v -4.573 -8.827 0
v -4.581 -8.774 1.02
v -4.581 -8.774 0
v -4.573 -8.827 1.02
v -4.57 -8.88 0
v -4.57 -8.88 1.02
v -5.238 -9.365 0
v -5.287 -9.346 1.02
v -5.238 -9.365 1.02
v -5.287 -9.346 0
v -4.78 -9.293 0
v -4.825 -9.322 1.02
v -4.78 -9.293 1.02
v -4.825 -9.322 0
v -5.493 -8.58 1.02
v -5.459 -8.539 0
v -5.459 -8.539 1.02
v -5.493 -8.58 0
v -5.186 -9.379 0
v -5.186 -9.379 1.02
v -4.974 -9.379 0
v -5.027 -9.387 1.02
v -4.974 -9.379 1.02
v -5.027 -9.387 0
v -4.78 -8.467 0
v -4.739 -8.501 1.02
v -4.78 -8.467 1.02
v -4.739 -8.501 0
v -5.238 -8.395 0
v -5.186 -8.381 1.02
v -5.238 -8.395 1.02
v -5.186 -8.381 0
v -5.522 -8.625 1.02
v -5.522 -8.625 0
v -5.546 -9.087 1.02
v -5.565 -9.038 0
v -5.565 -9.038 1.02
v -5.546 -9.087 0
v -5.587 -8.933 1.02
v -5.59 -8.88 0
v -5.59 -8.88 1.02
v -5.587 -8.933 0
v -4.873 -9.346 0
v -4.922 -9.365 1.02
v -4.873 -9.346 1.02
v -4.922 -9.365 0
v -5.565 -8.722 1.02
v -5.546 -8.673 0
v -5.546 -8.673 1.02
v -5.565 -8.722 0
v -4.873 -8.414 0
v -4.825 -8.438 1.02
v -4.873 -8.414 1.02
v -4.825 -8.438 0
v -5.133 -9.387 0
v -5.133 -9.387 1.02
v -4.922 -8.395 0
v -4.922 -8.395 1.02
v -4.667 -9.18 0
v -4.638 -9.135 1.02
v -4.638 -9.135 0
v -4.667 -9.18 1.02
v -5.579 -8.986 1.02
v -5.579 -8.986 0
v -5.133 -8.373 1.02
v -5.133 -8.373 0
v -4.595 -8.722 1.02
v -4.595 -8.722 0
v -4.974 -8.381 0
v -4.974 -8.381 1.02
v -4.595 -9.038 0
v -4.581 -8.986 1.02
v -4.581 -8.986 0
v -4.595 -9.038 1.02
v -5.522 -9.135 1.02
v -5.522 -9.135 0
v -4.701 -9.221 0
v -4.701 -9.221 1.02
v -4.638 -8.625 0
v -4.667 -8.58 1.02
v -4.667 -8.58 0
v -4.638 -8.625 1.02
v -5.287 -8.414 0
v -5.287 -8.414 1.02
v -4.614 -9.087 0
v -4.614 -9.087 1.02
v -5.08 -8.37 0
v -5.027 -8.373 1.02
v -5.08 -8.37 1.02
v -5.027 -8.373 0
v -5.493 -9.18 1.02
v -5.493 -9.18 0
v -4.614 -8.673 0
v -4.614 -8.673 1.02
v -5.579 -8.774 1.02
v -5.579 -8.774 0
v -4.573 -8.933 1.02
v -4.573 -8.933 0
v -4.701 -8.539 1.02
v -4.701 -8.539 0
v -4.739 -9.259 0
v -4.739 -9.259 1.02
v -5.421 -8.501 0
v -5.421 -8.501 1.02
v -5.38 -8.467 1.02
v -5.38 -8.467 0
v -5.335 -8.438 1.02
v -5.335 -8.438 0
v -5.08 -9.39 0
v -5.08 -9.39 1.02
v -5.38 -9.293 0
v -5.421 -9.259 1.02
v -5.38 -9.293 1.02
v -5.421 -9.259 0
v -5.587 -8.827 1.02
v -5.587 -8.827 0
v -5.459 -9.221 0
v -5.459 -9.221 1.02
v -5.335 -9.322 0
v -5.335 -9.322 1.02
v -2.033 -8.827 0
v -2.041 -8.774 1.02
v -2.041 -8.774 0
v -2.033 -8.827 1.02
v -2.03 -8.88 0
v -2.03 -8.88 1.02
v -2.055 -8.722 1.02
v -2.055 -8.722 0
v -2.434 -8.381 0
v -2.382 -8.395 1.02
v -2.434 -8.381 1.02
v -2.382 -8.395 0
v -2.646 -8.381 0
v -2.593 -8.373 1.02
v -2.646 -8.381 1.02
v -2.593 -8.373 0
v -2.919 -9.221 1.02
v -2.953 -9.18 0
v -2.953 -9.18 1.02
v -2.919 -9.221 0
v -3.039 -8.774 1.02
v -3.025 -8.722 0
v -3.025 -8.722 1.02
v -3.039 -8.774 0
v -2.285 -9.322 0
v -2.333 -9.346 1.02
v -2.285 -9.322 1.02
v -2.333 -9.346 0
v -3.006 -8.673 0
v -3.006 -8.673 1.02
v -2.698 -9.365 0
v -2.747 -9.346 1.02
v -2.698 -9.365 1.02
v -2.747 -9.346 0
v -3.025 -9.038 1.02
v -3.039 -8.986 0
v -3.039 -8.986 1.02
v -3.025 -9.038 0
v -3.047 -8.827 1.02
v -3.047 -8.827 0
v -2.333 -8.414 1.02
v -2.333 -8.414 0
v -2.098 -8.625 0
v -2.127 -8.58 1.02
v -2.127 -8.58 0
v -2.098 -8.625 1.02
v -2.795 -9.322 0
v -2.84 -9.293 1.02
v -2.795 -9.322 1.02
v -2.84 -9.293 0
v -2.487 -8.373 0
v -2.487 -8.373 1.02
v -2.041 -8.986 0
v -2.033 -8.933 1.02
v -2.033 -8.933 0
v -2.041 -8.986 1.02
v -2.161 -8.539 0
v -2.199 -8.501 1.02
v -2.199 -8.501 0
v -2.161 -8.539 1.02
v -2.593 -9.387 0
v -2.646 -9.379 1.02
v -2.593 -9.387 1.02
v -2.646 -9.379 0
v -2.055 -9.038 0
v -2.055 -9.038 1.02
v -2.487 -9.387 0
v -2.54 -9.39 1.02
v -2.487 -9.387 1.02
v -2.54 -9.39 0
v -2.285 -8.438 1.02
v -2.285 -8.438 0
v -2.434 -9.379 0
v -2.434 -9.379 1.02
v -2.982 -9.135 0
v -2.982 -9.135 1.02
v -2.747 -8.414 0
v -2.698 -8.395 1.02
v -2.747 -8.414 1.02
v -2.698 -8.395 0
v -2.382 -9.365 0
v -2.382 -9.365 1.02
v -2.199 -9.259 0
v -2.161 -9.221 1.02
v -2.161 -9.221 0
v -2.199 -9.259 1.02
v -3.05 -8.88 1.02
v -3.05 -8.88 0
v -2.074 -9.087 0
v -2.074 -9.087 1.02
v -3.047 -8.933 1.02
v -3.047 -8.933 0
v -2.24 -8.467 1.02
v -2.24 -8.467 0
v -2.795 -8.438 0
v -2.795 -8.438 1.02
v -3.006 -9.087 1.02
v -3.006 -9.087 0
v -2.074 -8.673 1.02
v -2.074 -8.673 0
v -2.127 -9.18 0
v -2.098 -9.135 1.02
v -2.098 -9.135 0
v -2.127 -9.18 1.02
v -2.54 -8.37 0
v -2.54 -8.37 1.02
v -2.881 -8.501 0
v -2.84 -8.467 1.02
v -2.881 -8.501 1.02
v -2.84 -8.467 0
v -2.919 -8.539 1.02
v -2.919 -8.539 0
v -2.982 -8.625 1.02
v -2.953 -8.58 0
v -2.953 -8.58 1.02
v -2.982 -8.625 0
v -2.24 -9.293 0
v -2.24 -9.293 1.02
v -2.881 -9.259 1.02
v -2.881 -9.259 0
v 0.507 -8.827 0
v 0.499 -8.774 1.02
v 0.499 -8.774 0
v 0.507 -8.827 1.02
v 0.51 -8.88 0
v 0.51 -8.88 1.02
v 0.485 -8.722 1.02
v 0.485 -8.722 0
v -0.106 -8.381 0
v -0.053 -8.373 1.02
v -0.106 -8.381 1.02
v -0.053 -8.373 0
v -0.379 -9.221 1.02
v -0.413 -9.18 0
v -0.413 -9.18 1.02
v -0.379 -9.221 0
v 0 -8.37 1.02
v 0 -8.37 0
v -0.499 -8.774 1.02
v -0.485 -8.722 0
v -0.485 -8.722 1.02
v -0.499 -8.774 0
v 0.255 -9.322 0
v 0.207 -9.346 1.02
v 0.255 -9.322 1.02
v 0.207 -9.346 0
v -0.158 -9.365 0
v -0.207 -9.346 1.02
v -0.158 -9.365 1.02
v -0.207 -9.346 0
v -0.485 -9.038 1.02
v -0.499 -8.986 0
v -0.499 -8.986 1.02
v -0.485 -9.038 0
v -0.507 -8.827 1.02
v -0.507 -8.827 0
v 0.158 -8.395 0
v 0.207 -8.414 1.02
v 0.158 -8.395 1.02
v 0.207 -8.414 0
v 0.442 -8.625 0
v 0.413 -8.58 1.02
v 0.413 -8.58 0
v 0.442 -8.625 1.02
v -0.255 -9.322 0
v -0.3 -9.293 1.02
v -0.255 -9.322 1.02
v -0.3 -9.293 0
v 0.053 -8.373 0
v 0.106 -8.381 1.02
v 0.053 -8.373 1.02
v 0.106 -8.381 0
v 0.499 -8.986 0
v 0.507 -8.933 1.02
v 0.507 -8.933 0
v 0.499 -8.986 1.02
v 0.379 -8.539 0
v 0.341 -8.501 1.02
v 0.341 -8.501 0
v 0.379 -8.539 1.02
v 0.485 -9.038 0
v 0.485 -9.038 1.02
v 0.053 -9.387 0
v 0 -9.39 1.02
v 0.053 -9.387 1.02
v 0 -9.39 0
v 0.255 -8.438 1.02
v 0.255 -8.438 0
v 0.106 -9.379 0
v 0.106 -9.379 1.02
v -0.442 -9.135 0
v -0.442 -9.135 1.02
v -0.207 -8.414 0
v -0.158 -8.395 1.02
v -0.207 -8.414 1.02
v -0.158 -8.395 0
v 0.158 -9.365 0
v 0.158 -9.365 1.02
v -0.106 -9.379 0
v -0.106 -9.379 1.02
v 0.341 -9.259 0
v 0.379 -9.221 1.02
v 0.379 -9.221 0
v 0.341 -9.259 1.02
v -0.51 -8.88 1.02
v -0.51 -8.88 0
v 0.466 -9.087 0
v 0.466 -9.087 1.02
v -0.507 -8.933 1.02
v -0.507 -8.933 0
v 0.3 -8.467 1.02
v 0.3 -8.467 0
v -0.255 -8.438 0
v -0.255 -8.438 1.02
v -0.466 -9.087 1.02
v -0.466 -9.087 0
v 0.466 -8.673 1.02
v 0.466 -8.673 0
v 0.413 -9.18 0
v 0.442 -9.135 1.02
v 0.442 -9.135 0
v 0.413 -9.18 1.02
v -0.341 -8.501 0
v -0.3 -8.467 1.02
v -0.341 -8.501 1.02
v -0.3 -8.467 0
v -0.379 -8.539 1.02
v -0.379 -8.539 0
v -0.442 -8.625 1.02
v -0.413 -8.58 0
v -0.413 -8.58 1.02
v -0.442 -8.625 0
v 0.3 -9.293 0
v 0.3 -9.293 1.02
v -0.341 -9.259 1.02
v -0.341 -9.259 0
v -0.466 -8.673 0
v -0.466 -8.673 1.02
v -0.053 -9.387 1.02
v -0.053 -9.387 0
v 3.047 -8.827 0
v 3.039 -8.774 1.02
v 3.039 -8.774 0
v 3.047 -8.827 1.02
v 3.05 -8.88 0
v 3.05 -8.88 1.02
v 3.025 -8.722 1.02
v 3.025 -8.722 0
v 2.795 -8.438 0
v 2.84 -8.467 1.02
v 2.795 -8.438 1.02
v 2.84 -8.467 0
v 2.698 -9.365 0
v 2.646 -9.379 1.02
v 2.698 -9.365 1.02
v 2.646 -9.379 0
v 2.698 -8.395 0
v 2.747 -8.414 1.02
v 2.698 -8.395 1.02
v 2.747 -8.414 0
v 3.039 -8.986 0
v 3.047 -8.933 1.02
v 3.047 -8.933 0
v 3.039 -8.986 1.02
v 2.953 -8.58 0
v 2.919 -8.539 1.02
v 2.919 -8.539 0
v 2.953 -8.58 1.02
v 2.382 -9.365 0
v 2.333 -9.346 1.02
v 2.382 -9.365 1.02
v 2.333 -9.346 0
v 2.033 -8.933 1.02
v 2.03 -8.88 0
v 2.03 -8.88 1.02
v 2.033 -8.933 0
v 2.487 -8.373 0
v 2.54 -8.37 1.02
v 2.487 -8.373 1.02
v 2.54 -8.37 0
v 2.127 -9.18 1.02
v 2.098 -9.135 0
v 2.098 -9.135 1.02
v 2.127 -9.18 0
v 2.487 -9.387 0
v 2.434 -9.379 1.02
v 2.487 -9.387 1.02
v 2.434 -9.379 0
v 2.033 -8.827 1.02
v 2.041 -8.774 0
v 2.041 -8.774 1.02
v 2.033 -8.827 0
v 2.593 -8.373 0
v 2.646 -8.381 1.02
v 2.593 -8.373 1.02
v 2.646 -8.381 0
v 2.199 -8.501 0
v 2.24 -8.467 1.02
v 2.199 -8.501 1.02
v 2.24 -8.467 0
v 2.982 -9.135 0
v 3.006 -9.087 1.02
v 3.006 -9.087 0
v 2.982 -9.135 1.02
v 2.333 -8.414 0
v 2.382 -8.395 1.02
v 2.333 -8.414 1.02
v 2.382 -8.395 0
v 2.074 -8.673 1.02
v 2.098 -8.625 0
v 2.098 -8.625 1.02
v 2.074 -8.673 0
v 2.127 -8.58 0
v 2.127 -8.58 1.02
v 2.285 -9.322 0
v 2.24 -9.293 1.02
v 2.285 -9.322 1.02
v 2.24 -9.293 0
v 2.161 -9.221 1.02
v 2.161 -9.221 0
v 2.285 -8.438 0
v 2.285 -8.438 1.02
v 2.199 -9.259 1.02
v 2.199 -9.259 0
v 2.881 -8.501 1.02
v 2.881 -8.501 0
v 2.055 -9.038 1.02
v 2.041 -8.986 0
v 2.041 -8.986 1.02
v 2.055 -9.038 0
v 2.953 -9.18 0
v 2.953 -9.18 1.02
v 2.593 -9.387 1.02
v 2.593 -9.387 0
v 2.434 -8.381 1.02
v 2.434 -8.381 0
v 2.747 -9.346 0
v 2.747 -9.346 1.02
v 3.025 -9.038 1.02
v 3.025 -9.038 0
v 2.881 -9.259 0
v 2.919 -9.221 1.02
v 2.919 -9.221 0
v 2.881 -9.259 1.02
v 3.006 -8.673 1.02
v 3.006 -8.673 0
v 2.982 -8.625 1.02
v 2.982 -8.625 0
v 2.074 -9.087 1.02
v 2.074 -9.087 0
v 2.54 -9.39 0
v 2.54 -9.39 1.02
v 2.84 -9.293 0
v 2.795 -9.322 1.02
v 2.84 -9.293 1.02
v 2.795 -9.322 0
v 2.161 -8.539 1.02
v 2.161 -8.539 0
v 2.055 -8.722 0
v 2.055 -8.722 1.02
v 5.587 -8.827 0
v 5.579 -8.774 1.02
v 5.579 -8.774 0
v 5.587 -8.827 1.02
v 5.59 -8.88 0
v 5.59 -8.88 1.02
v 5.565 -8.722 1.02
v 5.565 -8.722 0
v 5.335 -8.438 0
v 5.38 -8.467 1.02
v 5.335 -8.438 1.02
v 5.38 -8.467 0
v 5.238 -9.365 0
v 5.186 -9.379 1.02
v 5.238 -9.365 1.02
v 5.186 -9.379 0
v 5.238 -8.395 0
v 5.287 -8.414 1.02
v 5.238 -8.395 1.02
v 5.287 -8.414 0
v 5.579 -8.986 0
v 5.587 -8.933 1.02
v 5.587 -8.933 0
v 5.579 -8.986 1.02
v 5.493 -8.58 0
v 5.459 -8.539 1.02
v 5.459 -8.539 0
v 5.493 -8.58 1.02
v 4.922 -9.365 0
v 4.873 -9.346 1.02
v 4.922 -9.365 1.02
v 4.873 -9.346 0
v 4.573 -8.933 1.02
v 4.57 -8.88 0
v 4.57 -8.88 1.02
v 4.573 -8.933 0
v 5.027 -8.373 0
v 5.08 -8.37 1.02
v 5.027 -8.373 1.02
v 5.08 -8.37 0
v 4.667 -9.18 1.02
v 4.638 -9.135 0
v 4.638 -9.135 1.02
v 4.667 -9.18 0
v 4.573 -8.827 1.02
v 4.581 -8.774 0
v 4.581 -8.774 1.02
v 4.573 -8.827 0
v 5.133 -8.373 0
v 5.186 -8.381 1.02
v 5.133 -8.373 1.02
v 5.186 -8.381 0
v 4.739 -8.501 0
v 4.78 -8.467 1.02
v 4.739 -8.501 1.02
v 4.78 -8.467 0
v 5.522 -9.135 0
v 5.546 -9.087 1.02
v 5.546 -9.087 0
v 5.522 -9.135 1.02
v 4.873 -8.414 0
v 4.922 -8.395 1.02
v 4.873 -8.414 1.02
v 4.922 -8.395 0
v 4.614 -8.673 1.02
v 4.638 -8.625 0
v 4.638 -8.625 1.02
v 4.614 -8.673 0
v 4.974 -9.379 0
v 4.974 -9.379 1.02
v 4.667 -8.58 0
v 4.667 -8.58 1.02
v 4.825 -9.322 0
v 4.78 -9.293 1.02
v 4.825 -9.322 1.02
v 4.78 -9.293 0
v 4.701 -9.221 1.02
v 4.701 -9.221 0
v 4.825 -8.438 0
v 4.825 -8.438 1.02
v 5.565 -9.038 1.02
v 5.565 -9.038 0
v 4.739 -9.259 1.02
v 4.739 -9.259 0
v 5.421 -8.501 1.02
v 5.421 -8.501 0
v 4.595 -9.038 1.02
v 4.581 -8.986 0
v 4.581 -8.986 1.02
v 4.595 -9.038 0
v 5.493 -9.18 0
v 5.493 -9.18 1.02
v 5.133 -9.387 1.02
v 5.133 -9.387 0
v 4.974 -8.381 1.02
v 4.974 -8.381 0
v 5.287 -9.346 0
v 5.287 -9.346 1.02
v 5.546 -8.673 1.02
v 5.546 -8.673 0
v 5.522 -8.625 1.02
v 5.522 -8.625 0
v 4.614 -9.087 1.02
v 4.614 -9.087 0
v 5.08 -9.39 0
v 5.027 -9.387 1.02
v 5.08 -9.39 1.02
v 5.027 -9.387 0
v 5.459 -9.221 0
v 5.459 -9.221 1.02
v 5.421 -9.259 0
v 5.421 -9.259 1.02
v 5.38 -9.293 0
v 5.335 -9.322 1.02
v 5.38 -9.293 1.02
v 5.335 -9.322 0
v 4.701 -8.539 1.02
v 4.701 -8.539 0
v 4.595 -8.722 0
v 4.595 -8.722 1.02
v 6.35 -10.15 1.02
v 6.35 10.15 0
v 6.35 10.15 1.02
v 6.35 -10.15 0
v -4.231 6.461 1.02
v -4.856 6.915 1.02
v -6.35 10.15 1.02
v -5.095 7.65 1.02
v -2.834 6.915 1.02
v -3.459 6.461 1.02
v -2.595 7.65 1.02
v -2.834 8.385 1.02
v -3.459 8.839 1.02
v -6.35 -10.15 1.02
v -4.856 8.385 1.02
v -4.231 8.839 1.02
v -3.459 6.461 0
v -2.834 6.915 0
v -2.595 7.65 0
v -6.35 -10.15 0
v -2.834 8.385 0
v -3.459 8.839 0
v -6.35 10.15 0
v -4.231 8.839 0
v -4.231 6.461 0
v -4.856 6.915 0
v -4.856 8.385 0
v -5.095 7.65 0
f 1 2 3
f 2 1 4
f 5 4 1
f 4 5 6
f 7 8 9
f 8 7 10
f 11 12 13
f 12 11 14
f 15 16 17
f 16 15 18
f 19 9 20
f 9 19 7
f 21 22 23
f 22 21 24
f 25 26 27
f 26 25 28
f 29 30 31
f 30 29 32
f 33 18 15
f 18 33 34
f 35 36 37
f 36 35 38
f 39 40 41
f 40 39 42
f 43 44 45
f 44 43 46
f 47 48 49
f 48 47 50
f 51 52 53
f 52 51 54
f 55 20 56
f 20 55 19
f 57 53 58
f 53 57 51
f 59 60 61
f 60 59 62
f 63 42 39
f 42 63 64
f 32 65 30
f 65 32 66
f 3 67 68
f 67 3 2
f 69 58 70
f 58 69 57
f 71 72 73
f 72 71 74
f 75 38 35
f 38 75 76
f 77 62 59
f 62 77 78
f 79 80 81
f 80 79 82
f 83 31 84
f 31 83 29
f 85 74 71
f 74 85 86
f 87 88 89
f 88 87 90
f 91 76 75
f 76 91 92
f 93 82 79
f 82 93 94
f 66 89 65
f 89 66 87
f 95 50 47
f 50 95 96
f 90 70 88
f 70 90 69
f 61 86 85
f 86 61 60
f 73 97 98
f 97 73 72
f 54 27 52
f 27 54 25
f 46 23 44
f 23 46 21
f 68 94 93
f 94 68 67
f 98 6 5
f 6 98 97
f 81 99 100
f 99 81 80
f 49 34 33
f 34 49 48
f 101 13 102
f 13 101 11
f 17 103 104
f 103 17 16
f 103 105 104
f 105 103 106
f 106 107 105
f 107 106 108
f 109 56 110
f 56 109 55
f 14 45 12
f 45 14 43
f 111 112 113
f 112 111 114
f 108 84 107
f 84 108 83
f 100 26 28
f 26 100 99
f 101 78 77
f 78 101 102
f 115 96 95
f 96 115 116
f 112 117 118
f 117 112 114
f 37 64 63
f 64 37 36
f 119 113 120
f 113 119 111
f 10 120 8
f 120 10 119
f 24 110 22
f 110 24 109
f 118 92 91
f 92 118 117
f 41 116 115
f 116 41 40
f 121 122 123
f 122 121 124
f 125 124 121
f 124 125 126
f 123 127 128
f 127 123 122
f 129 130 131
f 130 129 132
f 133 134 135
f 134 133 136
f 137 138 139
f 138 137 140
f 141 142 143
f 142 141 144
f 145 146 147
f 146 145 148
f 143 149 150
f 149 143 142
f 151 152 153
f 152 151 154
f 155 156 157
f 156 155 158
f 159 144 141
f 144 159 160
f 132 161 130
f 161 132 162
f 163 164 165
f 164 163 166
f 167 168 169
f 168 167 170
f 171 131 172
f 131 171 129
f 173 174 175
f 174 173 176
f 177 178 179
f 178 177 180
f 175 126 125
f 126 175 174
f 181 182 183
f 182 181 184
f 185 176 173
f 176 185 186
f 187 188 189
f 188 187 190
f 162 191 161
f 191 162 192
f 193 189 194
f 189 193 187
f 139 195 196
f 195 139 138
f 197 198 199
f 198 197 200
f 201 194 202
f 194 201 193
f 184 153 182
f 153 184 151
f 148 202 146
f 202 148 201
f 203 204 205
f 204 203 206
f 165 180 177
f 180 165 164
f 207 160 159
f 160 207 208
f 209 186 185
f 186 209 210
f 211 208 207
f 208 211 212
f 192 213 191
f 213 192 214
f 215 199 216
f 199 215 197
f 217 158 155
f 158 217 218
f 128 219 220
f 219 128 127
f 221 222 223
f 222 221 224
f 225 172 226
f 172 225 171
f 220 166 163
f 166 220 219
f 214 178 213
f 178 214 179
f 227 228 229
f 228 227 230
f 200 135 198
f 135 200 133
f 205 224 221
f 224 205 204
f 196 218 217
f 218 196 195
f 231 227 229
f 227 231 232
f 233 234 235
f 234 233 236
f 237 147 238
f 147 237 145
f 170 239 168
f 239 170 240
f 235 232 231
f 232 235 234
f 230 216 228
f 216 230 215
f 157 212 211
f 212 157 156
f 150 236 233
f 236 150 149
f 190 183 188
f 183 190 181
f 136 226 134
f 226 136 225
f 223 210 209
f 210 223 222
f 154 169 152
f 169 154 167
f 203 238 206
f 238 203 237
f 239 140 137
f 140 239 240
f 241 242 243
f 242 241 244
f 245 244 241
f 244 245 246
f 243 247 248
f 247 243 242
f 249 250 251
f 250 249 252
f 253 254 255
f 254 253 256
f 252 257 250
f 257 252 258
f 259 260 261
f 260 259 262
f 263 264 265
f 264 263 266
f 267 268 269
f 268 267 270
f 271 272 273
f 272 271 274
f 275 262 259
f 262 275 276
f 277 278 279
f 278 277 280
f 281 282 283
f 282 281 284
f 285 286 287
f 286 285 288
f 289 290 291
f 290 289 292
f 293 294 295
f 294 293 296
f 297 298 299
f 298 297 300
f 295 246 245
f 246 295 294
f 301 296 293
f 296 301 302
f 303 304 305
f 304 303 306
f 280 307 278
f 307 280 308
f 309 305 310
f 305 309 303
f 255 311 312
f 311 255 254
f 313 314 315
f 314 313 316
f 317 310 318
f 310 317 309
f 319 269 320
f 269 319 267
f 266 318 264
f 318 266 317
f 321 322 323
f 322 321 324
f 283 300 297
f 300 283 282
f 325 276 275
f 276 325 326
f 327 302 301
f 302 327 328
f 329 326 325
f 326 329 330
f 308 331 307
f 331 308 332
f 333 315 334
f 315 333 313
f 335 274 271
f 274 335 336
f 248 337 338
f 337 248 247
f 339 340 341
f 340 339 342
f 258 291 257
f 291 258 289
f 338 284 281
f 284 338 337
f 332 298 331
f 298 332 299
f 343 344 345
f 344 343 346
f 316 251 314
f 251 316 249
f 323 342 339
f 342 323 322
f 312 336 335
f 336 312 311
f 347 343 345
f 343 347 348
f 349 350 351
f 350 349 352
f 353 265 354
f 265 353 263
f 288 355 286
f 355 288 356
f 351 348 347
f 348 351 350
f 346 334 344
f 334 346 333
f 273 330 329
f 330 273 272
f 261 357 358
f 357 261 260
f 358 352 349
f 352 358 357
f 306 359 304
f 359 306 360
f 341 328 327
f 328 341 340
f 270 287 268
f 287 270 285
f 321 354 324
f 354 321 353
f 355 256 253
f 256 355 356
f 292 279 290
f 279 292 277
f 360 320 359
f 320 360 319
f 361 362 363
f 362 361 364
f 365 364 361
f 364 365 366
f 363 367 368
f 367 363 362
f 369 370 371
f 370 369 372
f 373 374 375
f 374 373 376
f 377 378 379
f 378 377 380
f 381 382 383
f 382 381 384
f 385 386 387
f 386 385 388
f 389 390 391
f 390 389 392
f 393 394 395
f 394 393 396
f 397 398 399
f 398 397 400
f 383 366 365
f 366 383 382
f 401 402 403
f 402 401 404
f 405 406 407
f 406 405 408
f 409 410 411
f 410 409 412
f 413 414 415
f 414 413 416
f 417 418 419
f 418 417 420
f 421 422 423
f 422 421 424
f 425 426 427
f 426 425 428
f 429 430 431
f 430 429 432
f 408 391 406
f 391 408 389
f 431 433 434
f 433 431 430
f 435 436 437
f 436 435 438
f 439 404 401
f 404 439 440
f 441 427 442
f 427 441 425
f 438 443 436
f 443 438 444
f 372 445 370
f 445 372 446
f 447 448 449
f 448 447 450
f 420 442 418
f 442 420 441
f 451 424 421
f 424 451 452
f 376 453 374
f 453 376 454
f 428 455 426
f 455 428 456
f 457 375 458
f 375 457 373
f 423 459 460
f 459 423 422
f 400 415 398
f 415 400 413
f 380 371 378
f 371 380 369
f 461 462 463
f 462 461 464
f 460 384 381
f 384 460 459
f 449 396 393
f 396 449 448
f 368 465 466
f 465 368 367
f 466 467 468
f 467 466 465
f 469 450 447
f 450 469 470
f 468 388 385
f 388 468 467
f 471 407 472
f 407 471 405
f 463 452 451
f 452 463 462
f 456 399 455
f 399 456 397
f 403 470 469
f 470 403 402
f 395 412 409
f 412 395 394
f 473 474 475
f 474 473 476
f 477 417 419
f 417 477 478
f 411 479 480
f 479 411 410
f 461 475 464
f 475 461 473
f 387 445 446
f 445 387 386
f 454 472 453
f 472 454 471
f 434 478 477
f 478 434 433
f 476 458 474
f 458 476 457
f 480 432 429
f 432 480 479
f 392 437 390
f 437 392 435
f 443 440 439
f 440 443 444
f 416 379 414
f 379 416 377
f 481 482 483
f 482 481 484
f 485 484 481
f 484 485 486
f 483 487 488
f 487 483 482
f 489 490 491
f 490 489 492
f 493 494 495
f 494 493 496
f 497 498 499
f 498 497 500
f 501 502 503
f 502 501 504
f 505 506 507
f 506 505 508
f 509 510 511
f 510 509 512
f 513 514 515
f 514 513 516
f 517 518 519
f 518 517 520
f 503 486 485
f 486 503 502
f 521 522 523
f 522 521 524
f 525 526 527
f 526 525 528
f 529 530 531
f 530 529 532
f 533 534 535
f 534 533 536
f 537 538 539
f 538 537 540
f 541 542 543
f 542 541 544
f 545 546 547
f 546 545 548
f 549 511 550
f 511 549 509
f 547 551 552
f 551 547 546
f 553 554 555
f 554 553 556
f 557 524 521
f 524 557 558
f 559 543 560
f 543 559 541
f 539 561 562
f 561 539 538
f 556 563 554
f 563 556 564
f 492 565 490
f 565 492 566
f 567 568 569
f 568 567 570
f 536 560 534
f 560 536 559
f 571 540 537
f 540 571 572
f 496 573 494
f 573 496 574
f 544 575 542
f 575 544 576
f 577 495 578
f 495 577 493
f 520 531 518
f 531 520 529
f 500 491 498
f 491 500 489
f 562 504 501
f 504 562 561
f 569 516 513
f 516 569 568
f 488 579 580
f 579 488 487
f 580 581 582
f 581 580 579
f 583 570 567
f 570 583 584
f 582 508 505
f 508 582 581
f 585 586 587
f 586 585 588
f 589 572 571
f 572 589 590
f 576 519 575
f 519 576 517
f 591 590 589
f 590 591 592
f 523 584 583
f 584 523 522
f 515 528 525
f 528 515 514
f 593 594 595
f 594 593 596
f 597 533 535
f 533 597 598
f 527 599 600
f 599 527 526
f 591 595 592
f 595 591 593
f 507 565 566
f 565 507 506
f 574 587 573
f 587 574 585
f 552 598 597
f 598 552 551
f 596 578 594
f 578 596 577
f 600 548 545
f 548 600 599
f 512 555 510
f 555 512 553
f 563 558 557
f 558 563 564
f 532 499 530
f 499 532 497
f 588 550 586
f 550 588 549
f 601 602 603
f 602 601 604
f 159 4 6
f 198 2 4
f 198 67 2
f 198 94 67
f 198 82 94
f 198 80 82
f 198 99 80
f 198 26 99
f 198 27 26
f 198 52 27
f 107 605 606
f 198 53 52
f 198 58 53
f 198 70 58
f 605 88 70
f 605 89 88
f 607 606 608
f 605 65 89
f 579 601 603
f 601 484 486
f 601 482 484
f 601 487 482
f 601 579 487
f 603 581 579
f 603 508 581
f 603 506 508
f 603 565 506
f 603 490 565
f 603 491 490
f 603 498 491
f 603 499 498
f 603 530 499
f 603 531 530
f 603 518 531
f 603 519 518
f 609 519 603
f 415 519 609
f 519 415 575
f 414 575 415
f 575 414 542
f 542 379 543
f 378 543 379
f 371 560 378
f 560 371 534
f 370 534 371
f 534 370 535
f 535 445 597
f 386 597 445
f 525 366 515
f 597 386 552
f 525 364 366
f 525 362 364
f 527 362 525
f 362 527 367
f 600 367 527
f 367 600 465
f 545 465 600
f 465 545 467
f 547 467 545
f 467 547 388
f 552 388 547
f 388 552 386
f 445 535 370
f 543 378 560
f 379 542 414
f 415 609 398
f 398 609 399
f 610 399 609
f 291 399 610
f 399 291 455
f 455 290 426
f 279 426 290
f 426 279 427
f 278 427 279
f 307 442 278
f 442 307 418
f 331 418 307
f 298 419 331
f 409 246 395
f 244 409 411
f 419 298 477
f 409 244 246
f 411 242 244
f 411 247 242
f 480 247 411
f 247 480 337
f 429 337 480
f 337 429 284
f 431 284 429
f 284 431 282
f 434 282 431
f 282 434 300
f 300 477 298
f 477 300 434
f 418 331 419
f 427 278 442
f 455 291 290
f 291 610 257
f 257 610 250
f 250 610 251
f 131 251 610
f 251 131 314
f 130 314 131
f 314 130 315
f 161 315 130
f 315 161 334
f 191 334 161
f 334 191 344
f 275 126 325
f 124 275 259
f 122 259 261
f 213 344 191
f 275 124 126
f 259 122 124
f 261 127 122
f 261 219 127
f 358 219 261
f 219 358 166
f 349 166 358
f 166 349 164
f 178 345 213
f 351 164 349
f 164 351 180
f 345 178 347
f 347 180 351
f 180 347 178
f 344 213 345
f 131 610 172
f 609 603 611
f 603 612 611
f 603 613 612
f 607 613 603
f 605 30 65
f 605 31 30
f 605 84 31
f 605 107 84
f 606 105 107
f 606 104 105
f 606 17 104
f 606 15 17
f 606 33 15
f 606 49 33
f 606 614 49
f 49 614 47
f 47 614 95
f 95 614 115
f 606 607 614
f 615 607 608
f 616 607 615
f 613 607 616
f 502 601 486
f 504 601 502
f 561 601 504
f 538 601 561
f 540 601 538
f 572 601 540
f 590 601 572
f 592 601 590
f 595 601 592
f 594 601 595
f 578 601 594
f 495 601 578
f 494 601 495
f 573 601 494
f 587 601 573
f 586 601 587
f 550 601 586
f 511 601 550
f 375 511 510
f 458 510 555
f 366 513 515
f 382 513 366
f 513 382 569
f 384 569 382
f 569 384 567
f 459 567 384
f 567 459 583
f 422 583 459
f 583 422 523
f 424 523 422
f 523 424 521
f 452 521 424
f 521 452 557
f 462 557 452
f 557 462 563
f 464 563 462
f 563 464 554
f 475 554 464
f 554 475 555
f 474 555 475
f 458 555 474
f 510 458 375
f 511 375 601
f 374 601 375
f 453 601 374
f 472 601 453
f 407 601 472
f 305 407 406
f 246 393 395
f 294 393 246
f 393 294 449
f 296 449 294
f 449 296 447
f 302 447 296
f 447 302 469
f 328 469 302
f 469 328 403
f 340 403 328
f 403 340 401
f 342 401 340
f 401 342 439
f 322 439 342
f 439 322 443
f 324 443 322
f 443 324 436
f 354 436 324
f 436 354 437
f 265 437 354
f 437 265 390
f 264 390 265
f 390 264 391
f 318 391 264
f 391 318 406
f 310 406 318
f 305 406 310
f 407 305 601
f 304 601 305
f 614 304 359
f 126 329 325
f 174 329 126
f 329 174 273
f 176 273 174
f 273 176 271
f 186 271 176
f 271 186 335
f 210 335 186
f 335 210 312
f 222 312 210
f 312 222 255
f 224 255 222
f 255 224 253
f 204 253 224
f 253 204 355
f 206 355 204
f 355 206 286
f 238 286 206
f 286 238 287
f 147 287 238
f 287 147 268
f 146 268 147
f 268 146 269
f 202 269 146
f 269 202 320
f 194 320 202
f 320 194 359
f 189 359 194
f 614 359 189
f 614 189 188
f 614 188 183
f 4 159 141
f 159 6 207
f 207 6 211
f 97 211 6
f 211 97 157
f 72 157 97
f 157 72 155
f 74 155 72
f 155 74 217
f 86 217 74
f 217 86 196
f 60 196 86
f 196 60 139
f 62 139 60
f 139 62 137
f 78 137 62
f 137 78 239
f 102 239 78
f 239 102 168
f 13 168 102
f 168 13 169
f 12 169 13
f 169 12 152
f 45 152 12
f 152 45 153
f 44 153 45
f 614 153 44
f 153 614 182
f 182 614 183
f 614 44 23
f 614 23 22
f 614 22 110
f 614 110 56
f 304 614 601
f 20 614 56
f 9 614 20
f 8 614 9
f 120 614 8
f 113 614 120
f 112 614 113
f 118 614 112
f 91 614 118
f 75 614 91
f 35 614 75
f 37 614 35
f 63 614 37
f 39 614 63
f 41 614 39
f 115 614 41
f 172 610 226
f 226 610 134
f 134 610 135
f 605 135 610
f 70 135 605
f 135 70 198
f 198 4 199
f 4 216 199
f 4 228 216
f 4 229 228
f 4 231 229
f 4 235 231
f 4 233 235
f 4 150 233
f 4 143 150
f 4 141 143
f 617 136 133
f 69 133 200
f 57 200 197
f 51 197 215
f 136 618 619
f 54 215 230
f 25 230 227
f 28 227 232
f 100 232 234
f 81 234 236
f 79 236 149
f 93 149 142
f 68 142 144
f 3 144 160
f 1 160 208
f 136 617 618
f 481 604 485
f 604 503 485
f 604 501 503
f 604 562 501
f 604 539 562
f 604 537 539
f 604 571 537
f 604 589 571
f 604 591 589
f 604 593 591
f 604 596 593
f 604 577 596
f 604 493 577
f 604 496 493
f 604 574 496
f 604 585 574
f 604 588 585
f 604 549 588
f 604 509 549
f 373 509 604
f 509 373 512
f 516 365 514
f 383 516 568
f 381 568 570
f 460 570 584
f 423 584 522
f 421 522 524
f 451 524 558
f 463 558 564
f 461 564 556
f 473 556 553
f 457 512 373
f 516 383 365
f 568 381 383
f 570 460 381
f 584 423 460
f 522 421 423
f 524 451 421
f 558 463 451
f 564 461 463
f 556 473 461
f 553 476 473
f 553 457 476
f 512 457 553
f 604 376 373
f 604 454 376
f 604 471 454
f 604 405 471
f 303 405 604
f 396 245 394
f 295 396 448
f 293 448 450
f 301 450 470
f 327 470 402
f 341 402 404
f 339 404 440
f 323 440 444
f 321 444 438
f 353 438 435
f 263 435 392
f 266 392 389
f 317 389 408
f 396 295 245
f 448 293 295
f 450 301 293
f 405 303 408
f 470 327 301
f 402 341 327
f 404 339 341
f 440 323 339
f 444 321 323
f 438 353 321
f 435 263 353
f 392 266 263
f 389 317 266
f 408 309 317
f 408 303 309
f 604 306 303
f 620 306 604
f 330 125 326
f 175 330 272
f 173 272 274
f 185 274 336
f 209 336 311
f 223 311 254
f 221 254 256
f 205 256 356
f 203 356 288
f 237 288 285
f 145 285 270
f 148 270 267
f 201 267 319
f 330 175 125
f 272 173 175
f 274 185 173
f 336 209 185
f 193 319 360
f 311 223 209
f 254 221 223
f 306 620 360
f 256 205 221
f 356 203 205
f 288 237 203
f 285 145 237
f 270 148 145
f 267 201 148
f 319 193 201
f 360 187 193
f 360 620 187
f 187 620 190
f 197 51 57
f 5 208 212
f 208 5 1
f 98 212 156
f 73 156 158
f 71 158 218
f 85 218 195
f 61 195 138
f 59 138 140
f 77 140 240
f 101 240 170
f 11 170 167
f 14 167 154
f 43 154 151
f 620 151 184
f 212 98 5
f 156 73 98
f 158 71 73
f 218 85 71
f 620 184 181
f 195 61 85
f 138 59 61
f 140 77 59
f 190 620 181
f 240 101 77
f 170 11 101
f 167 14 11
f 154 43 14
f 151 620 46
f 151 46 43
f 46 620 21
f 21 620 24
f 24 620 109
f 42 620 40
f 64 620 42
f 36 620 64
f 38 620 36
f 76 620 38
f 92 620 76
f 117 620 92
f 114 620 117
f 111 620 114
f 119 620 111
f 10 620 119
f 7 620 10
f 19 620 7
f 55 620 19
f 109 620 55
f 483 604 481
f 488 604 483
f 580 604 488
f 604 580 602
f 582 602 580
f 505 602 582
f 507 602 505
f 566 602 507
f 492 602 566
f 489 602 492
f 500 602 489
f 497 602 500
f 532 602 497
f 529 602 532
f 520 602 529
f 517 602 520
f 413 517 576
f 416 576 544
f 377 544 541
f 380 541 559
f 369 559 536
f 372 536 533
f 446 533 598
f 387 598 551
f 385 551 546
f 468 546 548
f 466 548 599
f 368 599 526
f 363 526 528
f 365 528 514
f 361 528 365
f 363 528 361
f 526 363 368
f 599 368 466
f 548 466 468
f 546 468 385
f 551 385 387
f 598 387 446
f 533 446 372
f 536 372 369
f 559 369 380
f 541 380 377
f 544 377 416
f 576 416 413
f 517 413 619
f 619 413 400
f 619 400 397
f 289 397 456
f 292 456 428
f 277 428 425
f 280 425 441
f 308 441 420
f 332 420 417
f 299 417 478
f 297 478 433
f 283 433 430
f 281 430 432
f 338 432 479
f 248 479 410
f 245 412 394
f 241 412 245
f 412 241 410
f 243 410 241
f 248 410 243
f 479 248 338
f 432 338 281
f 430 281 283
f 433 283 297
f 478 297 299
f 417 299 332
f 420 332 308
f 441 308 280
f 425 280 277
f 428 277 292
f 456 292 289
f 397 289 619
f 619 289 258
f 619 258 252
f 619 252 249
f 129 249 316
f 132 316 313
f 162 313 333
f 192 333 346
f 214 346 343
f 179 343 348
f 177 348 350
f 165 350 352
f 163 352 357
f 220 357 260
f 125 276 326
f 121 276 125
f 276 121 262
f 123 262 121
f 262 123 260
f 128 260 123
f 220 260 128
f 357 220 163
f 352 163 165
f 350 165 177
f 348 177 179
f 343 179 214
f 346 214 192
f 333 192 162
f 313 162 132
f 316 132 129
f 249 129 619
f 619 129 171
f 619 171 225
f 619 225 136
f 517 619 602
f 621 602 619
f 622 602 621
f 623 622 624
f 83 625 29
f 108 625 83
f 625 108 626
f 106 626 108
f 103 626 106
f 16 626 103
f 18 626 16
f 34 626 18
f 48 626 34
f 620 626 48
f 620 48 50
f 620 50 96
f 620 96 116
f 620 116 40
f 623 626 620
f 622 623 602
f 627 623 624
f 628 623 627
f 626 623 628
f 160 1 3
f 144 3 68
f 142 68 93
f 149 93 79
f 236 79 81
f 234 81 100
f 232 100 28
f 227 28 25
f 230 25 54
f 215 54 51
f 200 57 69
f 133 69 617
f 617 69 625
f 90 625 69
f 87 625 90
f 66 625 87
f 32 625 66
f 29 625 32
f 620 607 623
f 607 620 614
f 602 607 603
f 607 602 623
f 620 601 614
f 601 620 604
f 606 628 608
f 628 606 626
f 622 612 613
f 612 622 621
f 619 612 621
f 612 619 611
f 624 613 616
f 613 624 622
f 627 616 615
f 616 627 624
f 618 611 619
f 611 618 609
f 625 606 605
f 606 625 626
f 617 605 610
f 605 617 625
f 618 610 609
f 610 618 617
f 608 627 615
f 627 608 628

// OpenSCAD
/**
  * Module: Generic Mini IMU placeholder
  *
  * Author: Karim Aziiev <karim.aziiev@gmail.com>
  * License: GPL-3.0-or-later
  */

include <../colors.scad>

use <../lib/placement.scad>
use <../lib/plist.scad>
use <../lib/shapes3d.scad>
use <../lib/slots.scad>
use <../lib/transforms.scad>

mini_imu_example_plist = ["size", [12.7, 20.3, 1.02],
                          "color", green_5,
                          "bolt_d", 2.5,
                          "bolt_spacing", [7.69, 15.3],
                          "bolt_spacing_corners", ["top_left"],
                          "interface", ["hole_d", 1.02,
                                        "pad", 0.5,
                                        "gap", 1.52,
                                        "corner_pad", 0.76,
                                        "reverse_side", false,
                                        "cols", 5, // cols | rows
                                        "default_text_props", ["gap", 4],
                                        "texts", ["SCL", "SDA", "GND", "VIN", "VDD"]],];

module mini_imu(plist, anchor=[0, 0, 1]) {
  size = plist_get("size", plist);
  w = size[0];
  l = size[1];
  t = size[2];
  color = plist_get("color", plist, green_5);

  bolt_d = plist_get("bolt_d", plist);
  bolt_spacing = plist_get("bolt_spacing", plist);
  bolt_spacing_corners = plist_get("bolt_spacing_corners", plist);

  interface = plist_get("interface", plist, []);
  interface_hole_d = plist_get("hole_d", interface);
  interface_pad = plist_get("pad", interface);
  interface_cols = plist_get("cols", interface);
  interface_gap = plist_get("gap", interface, 1.52);
  interface_rows = plist_get("rows", interface);
  interface_reverse_side = plist_get("reverse_side", interface, false);
  interface_corner_pad = plist_get("corner_pad", interface);
  interface_default_text_props = plist_get("default_text_props", interface, []);
  interface_default_text_props_gap = plist_get("gap",
                                               interface_default_text_props);
  interface_texts = plist_get("texts", interface);

  difference() {
    color(color, alpha=1) {
      cuboid(size=size);
    }
    if (bolt_spacing) {
      translate([0, 0, -0.1]) {
        four_corner_children(size=bolt_spacing, include=bolt_spacing_corners) {
          cylinder(d=bolt_d, h=t + 0.2, $fn=10);
        }
      }
    }

    if (interface_hole_d) {

      if (interface_cols) {
        mirror([0, interface_reverse_side ? 1 : 0, 0]) {
          translate([0,
                     -l / 2 + interface_hole_d / 2 + interface_corner_pad,
                     0]) {
            columns_children(cols=interface_cols,
                             w=interface_hole_d,
                             center=true,
                             gap=interface_gap) {
              counterbore(d=interface_hole_d, h=t);
            }
          }
        }
      } else if (interface_rows) {
        mirror([interface_reverse_side ? 1 : 0, 0, 0]) {
          translate([-w / 2 + interface_hole_d / 2 + interface_corner_pad,
                     0,
                     0]) {
            rows_children(rows=interface_rows,
                          w=interface_hole_d,
                          anchor=0,
                          gap=interface_gap) {
              counterbore(d=interface_hole_d, h=t);
            }
          }
        }
      }
    }
  }
}

mini_imu(mini_imu_example_plist);
